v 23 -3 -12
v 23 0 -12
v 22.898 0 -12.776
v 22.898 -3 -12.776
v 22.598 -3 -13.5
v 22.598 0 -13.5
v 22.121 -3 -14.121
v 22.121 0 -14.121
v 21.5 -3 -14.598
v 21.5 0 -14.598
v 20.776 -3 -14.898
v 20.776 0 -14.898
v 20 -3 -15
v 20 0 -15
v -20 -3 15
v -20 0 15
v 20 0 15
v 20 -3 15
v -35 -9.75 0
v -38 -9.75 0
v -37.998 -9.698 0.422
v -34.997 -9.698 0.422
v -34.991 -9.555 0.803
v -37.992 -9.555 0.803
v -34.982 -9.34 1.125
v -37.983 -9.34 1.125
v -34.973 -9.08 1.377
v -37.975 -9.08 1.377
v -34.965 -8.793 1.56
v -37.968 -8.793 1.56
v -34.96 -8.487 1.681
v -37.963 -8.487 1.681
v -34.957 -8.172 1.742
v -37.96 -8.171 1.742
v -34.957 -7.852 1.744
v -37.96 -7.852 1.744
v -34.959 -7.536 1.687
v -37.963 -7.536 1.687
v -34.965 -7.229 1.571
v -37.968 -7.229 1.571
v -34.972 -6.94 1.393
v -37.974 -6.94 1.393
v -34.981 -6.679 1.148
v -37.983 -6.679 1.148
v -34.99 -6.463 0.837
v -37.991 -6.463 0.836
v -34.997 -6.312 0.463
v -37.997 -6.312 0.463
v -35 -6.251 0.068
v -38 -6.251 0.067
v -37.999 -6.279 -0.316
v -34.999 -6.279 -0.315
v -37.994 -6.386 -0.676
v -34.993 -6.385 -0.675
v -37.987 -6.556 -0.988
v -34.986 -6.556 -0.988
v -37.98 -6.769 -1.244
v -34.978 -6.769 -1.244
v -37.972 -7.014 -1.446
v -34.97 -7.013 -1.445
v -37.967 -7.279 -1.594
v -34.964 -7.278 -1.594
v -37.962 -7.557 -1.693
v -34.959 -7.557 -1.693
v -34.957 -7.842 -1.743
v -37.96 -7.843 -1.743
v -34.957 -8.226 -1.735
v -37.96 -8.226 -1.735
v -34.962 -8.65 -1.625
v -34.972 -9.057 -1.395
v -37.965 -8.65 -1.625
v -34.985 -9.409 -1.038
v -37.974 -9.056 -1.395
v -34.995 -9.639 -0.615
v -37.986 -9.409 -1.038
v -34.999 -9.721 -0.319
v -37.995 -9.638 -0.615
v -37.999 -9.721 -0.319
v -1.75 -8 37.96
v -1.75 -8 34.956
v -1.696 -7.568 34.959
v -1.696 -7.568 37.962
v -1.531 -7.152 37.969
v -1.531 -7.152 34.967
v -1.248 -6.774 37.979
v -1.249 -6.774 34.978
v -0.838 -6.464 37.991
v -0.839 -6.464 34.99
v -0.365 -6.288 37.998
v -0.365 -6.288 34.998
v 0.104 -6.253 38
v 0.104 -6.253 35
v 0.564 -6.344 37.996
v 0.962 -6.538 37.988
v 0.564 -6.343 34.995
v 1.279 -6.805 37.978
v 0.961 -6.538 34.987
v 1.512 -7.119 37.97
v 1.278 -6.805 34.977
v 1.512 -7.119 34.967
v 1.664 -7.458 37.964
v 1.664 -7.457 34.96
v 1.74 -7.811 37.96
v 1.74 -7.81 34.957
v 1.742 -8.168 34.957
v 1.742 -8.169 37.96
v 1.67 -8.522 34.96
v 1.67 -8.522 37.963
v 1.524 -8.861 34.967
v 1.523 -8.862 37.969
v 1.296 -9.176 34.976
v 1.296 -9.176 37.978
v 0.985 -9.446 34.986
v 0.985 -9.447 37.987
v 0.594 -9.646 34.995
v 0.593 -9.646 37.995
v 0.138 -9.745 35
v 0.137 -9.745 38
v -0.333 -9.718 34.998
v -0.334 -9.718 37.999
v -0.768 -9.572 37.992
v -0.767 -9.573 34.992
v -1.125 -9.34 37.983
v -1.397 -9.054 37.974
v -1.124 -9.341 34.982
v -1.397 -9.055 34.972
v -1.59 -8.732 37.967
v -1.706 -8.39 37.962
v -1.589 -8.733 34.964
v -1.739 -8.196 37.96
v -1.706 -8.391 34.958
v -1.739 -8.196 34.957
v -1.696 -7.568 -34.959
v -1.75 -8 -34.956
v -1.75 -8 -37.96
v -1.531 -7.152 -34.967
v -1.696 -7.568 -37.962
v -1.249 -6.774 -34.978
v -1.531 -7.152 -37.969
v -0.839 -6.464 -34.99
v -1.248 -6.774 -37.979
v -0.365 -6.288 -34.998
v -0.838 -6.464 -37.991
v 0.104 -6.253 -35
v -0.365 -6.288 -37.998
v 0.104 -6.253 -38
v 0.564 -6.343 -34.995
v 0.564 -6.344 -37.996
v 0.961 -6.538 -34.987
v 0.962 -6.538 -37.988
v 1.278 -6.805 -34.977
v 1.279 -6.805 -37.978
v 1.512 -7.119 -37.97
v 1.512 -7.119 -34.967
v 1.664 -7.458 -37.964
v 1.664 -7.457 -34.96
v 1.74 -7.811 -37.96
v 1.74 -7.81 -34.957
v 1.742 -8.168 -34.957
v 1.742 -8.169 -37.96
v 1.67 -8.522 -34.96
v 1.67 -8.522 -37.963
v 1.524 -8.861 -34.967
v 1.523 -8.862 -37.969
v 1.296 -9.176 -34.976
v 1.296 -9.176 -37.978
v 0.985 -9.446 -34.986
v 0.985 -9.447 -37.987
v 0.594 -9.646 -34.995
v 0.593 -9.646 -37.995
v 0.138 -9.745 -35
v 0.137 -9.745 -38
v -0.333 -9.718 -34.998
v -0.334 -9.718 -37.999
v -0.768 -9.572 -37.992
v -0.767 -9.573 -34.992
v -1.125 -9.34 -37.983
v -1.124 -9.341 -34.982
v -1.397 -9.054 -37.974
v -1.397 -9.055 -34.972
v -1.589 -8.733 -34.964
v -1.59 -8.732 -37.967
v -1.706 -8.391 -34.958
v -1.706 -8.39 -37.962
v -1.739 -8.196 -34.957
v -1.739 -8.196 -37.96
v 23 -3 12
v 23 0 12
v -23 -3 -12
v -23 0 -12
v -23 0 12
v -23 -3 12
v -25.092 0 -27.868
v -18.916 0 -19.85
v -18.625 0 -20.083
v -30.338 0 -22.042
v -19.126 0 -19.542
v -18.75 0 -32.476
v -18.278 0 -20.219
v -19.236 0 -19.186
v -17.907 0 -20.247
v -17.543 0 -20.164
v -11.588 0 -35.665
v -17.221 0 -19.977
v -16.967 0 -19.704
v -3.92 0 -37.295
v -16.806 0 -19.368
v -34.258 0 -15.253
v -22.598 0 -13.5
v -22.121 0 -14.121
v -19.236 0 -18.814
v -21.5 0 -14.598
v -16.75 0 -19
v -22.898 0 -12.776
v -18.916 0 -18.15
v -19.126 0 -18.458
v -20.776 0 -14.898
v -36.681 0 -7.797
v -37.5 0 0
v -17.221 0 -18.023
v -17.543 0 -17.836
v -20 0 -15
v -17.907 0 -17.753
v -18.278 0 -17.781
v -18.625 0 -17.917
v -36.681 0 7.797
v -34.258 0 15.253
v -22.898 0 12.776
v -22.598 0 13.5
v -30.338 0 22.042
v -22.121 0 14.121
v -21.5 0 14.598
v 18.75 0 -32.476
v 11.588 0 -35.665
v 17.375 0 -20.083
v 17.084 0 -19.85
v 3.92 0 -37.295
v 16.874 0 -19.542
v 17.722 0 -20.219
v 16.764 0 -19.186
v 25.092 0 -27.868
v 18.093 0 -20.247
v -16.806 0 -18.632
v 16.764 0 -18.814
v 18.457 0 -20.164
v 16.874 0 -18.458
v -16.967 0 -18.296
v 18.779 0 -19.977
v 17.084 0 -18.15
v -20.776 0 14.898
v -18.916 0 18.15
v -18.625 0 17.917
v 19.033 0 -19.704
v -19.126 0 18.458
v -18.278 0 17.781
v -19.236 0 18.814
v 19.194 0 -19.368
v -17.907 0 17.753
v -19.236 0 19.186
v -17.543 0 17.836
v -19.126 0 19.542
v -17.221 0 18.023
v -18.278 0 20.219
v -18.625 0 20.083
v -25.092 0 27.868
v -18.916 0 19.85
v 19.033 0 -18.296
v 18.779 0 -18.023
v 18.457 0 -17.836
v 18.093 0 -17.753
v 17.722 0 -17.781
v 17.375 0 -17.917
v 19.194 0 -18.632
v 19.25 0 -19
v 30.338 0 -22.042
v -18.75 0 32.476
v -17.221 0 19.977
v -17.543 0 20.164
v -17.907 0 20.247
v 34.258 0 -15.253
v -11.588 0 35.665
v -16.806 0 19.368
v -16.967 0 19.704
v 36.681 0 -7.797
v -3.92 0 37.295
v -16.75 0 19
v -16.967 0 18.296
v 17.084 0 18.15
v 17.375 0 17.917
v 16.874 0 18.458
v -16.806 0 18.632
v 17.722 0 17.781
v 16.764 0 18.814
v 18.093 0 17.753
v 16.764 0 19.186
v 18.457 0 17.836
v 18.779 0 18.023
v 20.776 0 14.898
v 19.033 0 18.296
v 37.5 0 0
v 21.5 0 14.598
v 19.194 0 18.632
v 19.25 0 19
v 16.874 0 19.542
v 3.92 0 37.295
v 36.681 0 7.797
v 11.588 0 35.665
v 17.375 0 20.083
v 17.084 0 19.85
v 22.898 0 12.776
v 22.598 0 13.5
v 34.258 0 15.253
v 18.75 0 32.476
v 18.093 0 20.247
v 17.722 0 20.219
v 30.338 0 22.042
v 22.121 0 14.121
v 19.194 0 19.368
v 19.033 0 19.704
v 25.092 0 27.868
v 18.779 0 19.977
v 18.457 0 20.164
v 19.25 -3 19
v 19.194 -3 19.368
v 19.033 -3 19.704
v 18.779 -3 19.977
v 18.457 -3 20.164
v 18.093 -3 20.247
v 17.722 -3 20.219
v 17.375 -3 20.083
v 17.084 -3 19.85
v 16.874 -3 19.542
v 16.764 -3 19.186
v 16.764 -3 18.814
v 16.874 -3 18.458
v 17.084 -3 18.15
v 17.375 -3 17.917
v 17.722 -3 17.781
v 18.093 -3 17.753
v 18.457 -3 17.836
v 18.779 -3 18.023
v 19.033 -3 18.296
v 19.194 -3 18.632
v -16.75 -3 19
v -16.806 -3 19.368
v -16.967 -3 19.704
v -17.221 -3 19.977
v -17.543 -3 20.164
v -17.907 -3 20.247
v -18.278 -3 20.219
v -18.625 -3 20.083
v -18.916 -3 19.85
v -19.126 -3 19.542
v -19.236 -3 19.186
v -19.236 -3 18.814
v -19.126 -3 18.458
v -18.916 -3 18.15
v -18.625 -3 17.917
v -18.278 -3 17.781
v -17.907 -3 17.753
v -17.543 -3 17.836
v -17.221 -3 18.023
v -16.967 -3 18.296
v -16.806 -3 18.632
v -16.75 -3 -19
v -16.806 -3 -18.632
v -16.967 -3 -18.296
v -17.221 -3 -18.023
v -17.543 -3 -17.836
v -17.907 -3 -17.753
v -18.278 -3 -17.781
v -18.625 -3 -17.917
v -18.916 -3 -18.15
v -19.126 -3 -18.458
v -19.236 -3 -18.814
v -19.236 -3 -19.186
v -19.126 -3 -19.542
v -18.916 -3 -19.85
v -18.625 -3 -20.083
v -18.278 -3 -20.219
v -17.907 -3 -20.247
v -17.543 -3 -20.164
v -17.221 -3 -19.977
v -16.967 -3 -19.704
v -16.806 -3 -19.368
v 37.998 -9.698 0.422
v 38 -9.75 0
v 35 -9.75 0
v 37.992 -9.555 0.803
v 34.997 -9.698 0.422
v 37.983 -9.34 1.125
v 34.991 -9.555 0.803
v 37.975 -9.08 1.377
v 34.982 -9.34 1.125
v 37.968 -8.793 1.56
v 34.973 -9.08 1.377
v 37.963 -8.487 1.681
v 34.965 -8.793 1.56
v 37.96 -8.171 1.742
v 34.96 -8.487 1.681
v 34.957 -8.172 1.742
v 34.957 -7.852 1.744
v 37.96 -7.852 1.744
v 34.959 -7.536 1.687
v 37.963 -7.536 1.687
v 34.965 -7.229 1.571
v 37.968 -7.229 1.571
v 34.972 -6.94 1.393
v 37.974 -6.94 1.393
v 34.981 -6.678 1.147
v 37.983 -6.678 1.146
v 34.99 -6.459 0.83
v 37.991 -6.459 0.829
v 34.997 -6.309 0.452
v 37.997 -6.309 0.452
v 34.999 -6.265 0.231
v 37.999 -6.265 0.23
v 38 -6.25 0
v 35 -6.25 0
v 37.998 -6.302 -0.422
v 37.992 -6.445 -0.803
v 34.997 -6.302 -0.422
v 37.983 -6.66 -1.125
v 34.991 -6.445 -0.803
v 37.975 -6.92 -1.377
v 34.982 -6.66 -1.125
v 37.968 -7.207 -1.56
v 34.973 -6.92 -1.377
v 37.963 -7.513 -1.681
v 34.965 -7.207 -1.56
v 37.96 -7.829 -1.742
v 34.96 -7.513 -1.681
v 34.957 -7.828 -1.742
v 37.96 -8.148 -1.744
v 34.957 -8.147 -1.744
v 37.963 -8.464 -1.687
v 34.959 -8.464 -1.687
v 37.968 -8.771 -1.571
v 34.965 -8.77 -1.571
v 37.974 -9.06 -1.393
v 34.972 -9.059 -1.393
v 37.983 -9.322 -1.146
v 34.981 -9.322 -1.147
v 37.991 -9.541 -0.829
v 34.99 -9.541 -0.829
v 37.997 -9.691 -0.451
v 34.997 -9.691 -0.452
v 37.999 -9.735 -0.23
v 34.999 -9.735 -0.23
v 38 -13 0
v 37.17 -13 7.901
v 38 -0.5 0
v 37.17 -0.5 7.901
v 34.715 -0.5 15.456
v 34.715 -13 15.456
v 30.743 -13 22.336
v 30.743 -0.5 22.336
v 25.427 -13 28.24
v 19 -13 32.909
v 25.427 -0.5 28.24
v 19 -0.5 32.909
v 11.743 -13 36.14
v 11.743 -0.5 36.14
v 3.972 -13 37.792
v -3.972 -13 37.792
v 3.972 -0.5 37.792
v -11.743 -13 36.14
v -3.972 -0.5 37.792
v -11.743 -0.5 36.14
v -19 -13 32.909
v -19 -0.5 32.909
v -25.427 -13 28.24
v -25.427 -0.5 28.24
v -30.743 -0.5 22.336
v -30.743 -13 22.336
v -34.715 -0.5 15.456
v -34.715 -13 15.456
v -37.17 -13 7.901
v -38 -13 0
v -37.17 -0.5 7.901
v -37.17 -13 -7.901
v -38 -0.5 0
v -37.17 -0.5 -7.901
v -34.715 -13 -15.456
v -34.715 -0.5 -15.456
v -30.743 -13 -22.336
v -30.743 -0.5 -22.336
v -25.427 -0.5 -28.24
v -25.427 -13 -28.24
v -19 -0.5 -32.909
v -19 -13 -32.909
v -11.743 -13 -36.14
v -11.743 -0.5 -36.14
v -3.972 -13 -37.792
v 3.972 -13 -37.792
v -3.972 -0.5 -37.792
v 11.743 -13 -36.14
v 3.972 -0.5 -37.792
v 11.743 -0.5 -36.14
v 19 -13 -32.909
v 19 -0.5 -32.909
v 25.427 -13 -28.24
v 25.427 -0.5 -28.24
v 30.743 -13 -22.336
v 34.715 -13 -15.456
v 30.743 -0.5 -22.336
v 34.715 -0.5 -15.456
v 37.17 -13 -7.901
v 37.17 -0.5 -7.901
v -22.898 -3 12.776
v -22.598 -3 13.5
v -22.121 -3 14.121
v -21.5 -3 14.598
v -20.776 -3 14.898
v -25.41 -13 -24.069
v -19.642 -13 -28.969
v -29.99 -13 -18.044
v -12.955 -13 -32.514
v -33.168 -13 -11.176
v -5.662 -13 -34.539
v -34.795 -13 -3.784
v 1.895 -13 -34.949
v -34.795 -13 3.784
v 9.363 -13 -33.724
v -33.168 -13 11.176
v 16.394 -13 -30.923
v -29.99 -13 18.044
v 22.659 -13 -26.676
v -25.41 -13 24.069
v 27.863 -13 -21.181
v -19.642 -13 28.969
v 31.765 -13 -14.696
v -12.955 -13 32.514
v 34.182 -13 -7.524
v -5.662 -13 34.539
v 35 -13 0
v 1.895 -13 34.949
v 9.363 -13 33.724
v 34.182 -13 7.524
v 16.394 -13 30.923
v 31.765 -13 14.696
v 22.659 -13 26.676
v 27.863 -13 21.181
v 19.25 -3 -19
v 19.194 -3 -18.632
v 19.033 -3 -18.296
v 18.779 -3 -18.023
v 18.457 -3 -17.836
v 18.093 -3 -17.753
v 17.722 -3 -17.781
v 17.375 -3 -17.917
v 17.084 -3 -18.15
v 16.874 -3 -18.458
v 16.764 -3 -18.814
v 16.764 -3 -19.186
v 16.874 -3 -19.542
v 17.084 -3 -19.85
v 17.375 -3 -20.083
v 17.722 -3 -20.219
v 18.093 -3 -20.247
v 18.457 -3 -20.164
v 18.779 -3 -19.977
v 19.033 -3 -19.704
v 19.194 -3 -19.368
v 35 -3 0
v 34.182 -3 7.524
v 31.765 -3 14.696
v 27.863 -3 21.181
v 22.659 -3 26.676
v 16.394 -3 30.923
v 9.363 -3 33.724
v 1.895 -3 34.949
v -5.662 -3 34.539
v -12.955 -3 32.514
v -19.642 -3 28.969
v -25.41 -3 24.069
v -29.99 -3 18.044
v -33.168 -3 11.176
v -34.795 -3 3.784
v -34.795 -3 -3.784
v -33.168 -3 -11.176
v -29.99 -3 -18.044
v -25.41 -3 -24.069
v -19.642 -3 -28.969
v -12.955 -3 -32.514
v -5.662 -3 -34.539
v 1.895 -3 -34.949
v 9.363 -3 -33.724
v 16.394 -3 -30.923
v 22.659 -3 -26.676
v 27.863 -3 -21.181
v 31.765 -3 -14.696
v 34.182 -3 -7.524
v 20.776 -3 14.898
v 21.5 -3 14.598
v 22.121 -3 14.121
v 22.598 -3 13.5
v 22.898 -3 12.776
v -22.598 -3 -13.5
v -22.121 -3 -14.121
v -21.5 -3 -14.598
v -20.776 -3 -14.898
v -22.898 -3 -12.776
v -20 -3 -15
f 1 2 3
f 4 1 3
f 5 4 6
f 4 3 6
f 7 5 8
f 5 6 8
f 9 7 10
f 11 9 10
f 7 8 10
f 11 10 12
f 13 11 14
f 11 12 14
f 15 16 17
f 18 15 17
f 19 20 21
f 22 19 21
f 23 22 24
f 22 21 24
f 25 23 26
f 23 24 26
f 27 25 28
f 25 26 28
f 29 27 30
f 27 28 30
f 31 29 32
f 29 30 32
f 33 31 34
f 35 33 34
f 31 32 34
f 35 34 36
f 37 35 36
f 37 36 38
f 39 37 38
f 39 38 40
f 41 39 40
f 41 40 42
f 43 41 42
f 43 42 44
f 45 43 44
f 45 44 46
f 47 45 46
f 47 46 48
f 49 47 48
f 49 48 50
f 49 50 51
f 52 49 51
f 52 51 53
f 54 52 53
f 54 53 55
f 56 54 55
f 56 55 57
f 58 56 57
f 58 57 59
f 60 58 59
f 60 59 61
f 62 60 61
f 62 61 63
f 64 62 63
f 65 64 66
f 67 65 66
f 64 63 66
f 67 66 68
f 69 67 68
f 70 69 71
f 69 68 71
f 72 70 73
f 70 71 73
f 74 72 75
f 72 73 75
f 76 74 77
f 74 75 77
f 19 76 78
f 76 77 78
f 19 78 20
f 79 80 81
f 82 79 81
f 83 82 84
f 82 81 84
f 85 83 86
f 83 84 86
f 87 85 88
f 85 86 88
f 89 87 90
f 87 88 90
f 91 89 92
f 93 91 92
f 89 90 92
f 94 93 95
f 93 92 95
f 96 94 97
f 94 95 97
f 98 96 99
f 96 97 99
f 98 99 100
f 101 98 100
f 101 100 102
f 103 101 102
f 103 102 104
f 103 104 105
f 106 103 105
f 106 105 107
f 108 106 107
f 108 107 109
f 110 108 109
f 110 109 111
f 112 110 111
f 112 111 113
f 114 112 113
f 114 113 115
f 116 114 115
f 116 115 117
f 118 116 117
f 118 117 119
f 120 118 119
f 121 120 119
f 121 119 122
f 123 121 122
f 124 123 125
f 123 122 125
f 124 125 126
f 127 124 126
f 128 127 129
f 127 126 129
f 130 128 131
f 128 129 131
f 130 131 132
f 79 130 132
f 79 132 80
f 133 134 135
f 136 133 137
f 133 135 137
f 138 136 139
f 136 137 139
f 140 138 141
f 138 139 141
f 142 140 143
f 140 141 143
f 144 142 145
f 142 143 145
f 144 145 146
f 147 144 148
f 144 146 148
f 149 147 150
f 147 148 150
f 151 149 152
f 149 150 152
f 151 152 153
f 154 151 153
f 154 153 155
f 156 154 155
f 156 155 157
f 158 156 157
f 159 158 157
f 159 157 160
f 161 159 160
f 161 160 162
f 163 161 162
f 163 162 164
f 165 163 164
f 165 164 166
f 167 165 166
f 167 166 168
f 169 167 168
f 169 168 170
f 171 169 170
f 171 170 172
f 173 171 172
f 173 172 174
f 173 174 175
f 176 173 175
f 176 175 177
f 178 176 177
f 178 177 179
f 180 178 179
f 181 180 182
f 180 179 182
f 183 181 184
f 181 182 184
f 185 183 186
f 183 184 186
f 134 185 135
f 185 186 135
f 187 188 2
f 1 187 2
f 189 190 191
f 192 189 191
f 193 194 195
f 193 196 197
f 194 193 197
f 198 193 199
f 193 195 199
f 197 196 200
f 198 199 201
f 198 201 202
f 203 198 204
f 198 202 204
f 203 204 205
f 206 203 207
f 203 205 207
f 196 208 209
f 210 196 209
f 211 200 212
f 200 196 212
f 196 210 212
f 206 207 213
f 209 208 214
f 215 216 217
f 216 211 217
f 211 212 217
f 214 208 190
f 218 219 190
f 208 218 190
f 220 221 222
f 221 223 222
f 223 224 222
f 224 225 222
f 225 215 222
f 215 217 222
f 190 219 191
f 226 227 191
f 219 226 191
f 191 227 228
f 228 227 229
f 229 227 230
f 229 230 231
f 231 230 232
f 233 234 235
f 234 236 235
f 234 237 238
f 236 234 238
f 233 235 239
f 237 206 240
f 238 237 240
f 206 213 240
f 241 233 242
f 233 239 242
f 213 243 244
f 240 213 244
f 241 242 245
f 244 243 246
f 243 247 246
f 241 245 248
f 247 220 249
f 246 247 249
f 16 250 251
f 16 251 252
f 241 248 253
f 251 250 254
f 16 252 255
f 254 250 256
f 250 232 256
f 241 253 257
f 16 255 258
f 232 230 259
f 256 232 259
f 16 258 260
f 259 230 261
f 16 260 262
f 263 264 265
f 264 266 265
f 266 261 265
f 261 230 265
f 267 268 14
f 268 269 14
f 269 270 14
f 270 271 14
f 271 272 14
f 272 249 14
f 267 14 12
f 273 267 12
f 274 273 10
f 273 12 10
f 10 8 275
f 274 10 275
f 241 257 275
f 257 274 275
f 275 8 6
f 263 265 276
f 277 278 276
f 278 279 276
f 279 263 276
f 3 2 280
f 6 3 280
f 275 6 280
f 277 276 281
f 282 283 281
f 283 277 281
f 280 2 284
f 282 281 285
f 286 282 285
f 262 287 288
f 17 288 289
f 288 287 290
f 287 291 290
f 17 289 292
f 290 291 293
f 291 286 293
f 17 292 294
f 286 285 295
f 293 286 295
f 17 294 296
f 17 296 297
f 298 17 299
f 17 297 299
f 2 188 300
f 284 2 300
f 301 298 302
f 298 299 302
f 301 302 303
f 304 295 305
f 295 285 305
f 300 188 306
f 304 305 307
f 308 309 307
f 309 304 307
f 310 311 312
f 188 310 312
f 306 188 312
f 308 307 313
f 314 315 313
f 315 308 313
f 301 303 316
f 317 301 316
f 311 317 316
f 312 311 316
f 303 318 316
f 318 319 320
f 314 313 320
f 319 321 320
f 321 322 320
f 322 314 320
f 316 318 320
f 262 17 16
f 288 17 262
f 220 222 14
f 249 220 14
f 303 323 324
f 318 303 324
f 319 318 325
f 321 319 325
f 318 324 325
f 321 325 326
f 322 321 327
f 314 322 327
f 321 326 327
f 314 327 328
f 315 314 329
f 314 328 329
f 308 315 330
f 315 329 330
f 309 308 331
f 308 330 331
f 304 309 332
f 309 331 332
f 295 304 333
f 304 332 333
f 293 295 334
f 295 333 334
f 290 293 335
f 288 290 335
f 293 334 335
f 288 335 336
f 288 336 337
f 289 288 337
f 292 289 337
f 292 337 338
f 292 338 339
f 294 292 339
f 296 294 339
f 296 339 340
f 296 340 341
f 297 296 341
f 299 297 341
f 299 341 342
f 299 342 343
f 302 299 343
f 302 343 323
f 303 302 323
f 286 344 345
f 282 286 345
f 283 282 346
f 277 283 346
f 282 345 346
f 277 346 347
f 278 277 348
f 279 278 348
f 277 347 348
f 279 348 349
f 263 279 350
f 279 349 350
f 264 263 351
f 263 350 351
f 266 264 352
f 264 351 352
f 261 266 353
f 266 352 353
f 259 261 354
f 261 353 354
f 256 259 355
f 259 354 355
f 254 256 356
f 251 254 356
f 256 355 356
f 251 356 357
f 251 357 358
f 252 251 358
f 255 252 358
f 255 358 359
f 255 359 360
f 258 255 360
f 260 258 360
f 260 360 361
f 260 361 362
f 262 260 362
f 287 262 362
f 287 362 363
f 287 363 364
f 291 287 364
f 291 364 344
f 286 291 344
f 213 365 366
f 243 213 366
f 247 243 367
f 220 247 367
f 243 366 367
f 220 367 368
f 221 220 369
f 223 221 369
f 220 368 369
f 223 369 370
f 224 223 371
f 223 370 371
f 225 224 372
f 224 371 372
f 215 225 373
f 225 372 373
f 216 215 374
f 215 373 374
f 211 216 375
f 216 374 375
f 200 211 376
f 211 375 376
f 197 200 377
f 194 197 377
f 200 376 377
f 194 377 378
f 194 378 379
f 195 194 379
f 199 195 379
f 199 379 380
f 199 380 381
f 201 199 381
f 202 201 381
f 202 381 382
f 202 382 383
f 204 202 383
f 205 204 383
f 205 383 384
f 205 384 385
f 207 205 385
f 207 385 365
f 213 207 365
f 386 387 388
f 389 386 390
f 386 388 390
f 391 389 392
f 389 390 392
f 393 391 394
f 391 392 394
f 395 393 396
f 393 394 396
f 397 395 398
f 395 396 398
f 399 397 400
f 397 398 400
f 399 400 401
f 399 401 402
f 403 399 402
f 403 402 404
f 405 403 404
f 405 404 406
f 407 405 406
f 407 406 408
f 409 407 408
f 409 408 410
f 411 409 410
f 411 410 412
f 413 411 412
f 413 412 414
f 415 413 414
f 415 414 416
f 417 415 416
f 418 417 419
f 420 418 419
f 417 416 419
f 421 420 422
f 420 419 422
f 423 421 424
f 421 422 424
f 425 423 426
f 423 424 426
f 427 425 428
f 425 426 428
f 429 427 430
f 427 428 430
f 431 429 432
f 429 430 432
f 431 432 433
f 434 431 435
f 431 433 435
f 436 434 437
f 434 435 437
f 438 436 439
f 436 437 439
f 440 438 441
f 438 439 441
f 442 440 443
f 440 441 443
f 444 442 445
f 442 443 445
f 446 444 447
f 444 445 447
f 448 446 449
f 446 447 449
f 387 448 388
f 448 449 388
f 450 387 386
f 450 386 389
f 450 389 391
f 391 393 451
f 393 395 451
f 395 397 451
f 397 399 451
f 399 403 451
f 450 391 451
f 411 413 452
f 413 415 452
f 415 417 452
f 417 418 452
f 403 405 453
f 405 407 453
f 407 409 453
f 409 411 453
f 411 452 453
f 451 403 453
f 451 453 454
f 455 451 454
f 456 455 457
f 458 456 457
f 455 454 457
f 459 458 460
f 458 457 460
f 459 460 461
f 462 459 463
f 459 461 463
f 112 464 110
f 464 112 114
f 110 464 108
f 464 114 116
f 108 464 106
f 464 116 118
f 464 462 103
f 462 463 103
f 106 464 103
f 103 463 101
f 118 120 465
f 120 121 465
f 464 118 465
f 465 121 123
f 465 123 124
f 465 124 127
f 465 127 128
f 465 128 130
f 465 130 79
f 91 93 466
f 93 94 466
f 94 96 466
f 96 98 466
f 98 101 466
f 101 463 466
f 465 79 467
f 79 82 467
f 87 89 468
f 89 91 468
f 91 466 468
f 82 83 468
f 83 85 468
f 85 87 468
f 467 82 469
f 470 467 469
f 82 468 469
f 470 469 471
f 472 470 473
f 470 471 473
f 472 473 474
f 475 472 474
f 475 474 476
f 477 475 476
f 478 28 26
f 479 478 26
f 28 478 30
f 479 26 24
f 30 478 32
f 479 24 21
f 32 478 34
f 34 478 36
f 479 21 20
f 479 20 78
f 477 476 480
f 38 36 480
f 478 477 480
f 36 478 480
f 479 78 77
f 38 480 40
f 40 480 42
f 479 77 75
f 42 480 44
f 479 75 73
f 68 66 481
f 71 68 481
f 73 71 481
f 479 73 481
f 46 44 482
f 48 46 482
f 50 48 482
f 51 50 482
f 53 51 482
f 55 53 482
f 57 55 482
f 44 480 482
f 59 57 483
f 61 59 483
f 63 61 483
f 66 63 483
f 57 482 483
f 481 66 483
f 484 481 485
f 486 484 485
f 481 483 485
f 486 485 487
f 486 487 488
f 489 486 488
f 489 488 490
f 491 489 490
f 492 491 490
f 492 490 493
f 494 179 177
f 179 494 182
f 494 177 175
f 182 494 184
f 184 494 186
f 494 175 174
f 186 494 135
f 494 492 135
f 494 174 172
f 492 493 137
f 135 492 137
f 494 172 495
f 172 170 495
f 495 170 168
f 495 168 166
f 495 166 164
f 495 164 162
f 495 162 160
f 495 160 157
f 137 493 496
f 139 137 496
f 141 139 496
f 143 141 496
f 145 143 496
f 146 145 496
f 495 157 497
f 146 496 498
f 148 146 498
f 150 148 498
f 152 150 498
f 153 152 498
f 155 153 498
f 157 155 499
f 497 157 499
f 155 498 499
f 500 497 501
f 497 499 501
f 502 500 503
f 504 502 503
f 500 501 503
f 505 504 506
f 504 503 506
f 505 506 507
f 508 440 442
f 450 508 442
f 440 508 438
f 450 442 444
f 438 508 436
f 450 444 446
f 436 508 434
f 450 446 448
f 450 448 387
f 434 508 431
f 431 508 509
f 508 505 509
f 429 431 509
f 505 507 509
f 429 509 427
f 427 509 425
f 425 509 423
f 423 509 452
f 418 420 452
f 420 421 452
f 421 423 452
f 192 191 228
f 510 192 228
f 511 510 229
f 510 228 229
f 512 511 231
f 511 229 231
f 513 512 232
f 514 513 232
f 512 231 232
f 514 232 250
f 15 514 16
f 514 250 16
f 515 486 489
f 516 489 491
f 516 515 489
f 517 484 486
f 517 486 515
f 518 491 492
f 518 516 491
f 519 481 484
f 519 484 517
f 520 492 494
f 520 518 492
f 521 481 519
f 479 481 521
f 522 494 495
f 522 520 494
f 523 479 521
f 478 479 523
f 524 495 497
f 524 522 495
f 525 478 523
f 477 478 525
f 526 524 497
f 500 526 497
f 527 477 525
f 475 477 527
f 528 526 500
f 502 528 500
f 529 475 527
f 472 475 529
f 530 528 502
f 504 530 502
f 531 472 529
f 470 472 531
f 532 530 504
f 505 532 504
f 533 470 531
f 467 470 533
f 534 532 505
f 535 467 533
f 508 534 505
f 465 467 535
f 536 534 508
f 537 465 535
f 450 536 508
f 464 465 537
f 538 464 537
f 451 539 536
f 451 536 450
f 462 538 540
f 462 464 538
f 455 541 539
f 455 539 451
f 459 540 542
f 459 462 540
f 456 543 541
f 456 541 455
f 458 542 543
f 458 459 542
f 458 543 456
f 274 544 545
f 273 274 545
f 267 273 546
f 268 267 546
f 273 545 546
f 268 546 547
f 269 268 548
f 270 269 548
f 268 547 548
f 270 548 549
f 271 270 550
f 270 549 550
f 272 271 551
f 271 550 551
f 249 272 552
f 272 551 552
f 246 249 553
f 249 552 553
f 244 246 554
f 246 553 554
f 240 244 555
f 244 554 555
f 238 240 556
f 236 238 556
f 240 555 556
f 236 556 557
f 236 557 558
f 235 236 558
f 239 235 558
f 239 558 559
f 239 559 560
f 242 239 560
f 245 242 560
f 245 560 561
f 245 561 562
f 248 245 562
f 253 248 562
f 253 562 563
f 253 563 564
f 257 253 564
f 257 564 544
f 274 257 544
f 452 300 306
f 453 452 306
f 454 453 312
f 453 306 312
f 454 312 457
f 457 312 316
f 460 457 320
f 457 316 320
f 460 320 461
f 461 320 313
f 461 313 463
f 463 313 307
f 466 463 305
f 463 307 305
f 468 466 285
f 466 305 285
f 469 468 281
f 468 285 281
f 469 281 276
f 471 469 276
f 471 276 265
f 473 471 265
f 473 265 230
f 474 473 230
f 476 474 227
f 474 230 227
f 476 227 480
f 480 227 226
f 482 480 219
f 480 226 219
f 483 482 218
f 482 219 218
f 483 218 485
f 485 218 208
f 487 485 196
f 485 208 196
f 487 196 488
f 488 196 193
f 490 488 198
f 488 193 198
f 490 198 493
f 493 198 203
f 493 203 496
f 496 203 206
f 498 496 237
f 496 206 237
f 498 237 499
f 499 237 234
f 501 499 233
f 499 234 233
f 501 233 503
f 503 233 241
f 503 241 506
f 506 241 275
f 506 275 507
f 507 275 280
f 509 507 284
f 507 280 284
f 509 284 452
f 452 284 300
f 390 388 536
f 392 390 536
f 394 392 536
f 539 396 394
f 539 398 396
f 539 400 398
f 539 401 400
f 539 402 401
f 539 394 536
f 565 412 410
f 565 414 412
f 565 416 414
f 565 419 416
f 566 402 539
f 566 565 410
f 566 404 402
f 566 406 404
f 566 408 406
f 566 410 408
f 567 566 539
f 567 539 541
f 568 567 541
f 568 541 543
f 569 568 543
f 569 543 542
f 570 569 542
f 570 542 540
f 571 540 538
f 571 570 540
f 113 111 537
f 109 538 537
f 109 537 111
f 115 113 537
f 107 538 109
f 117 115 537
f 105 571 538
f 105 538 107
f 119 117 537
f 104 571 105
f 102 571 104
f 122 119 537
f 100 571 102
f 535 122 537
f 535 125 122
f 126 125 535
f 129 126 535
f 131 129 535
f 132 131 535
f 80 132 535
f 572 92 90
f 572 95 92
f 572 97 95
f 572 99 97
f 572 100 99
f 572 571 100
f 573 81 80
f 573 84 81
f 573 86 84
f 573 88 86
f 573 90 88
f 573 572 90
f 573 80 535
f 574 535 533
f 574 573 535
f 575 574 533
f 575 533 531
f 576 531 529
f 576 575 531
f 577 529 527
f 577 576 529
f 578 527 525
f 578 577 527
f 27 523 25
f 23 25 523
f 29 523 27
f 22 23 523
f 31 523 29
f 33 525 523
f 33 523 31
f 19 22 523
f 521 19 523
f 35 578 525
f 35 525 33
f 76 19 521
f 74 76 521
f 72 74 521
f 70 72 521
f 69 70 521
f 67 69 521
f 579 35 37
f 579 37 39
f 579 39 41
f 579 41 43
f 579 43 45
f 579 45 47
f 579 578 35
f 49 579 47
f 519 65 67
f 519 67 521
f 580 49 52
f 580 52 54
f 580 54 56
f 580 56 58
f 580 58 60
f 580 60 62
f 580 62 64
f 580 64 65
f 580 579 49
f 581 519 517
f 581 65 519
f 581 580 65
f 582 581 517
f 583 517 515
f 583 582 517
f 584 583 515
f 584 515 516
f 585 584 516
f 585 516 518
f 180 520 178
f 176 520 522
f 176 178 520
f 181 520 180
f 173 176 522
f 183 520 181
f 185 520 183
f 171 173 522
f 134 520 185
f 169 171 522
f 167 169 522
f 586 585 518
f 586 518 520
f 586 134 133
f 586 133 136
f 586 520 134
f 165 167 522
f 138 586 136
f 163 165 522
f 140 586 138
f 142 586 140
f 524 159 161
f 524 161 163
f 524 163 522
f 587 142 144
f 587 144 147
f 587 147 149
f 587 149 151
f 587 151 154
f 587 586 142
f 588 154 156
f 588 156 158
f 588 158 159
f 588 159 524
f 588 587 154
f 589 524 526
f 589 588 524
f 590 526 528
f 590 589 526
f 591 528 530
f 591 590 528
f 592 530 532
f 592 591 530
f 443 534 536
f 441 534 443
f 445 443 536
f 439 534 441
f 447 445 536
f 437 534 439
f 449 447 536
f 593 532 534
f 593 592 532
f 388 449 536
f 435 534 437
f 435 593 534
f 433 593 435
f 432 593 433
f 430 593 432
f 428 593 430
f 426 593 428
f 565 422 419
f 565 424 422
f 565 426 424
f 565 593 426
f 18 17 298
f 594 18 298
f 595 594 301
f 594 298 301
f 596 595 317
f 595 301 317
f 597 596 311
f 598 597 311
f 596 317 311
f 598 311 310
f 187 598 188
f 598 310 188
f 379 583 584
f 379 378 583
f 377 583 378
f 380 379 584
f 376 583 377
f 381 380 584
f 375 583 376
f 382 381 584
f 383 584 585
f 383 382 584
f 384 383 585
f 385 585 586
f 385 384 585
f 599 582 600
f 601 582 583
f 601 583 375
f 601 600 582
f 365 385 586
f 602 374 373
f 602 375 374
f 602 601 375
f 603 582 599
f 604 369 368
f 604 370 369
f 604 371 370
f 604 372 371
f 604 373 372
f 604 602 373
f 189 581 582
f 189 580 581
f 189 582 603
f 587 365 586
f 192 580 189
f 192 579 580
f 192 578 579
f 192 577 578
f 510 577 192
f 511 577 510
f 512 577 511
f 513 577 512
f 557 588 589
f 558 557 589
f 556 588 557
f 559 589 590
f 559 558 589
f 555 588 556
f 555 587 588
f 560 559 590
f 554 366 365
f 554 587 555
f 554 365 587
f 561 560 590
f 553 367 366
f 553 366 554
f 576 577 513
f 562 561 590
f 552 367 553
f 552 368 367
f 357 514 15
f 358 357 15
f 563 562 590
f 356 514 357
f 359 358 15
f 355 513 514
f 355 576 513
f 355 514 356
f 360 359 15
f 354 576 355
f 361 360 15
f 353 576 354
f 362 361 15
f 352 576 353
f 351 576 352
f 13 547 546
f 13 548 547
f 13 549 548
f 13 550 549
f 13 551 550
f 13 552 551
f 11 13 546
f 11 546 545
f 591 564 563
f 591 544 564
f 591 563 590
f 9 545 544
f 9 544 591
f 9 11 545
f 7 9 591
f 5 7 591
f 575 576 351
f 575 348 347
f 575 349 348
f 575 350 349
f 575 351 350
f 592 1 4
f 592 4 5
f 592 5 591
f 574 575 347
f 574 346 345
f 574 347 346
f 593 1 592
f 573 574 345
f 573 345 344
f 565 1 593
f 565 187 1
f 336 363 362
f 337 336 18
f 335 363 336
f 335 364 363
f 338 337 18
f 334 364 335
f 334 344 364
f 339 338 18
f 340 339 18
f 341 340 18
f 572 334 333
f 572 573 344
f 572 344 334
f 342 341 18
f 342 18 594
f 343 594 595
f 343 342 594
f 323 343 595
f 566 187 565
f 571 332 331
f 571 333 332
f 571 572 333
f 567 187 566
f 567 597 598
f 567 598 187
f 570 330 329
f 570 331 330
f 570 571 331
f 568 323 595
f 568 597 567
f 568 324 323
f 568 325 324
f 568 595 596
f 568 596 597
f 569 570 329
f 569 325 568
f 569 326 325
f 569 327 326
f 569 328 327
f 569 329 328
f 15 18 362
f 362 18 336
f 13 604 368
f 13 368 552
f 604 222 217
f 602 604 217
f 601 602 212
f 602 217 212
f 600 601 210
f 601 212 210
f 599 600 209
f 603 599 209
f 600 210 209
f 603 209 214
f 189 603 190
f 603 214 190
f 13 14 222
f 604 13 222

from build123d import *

# Parameters (mm, degrees)
F0_R     = 38
F1_DEPTH = 13
F2_T     = -3
F4_DEPTH = 25
F6_D     = 2.5
F9_D     = 3.5
F12_D    = 3.5
F13_SIZE = 0.5


with BuildPart() as f1:
    # F0 (on Front) → F1 (new body)
    with BuildSketch(Plane.XZ):
        Circle(F0_R)
    extrude(amount=F1_DEPTH)

    # F2
    f2_openings = [f1.faces().sort_by_distance(p)[0] for p in [
        (0, -13, 0),
    ]]
    offset(amount=F2_T, openings=f2_openings)

    # F3 (on face) → F4 (cut)
    with BuildSketch(Plane(origin=(0, 0, 0), x_dir=(-1, 0, 0), z_dir=(0, 1, 0))):
        with BuildLine():
            Line((20, 15), (-20, 15))
            ThreePointArc((-20, 15), (-22.1213203436, 14.1213203436), (-23, 12))
            Line((-23, 12), (-23, -12))
            ThreePointArc((-23, -12), (-22.1213203436, -14.1213203436), (-20, -15))
            Line((-20, -15), (20, -15))
            ThreePointArc((20, -15), (22.1213203436, -14.1213203436), (23, -12))
            Line((23, -12), (23, 12))
            ThreePointArc((23, 12), (22.1213203436, 14.1213203436), (20, 15))
        make_face()
    extrude(amount=-F4_DEPTH, mode=Mode.SUBTRACT)

    # F6 (through all)
    with Locations(Plane(origin=(0, 0, 0), x_dir=(-1, 0, 0), z_dir=(0, 1, 0))):
        with Locations((18, 19), (-18, 19), (-18, -19), (18, -19)):
            Hole(F6_D / 2)

    # F9 (through all)
    with Locations(Plane.YZ.offset(38)):
        with Locations((-8, 0)):
            Hole(F9_D / 2)

    # F12 (through all)
    with Locations(Plane.XY.offset(38)):
        with Locations((0, -8)):
            Hole(F12_D / 2)

    # F13
    f13_edges = [f1.edges().sort_by_distance(p)[0] for p in [
        (-38, 0, 0),
    ]]
    chamfer(f13_edges, length=F13_SIZE)


solid = f1.part
